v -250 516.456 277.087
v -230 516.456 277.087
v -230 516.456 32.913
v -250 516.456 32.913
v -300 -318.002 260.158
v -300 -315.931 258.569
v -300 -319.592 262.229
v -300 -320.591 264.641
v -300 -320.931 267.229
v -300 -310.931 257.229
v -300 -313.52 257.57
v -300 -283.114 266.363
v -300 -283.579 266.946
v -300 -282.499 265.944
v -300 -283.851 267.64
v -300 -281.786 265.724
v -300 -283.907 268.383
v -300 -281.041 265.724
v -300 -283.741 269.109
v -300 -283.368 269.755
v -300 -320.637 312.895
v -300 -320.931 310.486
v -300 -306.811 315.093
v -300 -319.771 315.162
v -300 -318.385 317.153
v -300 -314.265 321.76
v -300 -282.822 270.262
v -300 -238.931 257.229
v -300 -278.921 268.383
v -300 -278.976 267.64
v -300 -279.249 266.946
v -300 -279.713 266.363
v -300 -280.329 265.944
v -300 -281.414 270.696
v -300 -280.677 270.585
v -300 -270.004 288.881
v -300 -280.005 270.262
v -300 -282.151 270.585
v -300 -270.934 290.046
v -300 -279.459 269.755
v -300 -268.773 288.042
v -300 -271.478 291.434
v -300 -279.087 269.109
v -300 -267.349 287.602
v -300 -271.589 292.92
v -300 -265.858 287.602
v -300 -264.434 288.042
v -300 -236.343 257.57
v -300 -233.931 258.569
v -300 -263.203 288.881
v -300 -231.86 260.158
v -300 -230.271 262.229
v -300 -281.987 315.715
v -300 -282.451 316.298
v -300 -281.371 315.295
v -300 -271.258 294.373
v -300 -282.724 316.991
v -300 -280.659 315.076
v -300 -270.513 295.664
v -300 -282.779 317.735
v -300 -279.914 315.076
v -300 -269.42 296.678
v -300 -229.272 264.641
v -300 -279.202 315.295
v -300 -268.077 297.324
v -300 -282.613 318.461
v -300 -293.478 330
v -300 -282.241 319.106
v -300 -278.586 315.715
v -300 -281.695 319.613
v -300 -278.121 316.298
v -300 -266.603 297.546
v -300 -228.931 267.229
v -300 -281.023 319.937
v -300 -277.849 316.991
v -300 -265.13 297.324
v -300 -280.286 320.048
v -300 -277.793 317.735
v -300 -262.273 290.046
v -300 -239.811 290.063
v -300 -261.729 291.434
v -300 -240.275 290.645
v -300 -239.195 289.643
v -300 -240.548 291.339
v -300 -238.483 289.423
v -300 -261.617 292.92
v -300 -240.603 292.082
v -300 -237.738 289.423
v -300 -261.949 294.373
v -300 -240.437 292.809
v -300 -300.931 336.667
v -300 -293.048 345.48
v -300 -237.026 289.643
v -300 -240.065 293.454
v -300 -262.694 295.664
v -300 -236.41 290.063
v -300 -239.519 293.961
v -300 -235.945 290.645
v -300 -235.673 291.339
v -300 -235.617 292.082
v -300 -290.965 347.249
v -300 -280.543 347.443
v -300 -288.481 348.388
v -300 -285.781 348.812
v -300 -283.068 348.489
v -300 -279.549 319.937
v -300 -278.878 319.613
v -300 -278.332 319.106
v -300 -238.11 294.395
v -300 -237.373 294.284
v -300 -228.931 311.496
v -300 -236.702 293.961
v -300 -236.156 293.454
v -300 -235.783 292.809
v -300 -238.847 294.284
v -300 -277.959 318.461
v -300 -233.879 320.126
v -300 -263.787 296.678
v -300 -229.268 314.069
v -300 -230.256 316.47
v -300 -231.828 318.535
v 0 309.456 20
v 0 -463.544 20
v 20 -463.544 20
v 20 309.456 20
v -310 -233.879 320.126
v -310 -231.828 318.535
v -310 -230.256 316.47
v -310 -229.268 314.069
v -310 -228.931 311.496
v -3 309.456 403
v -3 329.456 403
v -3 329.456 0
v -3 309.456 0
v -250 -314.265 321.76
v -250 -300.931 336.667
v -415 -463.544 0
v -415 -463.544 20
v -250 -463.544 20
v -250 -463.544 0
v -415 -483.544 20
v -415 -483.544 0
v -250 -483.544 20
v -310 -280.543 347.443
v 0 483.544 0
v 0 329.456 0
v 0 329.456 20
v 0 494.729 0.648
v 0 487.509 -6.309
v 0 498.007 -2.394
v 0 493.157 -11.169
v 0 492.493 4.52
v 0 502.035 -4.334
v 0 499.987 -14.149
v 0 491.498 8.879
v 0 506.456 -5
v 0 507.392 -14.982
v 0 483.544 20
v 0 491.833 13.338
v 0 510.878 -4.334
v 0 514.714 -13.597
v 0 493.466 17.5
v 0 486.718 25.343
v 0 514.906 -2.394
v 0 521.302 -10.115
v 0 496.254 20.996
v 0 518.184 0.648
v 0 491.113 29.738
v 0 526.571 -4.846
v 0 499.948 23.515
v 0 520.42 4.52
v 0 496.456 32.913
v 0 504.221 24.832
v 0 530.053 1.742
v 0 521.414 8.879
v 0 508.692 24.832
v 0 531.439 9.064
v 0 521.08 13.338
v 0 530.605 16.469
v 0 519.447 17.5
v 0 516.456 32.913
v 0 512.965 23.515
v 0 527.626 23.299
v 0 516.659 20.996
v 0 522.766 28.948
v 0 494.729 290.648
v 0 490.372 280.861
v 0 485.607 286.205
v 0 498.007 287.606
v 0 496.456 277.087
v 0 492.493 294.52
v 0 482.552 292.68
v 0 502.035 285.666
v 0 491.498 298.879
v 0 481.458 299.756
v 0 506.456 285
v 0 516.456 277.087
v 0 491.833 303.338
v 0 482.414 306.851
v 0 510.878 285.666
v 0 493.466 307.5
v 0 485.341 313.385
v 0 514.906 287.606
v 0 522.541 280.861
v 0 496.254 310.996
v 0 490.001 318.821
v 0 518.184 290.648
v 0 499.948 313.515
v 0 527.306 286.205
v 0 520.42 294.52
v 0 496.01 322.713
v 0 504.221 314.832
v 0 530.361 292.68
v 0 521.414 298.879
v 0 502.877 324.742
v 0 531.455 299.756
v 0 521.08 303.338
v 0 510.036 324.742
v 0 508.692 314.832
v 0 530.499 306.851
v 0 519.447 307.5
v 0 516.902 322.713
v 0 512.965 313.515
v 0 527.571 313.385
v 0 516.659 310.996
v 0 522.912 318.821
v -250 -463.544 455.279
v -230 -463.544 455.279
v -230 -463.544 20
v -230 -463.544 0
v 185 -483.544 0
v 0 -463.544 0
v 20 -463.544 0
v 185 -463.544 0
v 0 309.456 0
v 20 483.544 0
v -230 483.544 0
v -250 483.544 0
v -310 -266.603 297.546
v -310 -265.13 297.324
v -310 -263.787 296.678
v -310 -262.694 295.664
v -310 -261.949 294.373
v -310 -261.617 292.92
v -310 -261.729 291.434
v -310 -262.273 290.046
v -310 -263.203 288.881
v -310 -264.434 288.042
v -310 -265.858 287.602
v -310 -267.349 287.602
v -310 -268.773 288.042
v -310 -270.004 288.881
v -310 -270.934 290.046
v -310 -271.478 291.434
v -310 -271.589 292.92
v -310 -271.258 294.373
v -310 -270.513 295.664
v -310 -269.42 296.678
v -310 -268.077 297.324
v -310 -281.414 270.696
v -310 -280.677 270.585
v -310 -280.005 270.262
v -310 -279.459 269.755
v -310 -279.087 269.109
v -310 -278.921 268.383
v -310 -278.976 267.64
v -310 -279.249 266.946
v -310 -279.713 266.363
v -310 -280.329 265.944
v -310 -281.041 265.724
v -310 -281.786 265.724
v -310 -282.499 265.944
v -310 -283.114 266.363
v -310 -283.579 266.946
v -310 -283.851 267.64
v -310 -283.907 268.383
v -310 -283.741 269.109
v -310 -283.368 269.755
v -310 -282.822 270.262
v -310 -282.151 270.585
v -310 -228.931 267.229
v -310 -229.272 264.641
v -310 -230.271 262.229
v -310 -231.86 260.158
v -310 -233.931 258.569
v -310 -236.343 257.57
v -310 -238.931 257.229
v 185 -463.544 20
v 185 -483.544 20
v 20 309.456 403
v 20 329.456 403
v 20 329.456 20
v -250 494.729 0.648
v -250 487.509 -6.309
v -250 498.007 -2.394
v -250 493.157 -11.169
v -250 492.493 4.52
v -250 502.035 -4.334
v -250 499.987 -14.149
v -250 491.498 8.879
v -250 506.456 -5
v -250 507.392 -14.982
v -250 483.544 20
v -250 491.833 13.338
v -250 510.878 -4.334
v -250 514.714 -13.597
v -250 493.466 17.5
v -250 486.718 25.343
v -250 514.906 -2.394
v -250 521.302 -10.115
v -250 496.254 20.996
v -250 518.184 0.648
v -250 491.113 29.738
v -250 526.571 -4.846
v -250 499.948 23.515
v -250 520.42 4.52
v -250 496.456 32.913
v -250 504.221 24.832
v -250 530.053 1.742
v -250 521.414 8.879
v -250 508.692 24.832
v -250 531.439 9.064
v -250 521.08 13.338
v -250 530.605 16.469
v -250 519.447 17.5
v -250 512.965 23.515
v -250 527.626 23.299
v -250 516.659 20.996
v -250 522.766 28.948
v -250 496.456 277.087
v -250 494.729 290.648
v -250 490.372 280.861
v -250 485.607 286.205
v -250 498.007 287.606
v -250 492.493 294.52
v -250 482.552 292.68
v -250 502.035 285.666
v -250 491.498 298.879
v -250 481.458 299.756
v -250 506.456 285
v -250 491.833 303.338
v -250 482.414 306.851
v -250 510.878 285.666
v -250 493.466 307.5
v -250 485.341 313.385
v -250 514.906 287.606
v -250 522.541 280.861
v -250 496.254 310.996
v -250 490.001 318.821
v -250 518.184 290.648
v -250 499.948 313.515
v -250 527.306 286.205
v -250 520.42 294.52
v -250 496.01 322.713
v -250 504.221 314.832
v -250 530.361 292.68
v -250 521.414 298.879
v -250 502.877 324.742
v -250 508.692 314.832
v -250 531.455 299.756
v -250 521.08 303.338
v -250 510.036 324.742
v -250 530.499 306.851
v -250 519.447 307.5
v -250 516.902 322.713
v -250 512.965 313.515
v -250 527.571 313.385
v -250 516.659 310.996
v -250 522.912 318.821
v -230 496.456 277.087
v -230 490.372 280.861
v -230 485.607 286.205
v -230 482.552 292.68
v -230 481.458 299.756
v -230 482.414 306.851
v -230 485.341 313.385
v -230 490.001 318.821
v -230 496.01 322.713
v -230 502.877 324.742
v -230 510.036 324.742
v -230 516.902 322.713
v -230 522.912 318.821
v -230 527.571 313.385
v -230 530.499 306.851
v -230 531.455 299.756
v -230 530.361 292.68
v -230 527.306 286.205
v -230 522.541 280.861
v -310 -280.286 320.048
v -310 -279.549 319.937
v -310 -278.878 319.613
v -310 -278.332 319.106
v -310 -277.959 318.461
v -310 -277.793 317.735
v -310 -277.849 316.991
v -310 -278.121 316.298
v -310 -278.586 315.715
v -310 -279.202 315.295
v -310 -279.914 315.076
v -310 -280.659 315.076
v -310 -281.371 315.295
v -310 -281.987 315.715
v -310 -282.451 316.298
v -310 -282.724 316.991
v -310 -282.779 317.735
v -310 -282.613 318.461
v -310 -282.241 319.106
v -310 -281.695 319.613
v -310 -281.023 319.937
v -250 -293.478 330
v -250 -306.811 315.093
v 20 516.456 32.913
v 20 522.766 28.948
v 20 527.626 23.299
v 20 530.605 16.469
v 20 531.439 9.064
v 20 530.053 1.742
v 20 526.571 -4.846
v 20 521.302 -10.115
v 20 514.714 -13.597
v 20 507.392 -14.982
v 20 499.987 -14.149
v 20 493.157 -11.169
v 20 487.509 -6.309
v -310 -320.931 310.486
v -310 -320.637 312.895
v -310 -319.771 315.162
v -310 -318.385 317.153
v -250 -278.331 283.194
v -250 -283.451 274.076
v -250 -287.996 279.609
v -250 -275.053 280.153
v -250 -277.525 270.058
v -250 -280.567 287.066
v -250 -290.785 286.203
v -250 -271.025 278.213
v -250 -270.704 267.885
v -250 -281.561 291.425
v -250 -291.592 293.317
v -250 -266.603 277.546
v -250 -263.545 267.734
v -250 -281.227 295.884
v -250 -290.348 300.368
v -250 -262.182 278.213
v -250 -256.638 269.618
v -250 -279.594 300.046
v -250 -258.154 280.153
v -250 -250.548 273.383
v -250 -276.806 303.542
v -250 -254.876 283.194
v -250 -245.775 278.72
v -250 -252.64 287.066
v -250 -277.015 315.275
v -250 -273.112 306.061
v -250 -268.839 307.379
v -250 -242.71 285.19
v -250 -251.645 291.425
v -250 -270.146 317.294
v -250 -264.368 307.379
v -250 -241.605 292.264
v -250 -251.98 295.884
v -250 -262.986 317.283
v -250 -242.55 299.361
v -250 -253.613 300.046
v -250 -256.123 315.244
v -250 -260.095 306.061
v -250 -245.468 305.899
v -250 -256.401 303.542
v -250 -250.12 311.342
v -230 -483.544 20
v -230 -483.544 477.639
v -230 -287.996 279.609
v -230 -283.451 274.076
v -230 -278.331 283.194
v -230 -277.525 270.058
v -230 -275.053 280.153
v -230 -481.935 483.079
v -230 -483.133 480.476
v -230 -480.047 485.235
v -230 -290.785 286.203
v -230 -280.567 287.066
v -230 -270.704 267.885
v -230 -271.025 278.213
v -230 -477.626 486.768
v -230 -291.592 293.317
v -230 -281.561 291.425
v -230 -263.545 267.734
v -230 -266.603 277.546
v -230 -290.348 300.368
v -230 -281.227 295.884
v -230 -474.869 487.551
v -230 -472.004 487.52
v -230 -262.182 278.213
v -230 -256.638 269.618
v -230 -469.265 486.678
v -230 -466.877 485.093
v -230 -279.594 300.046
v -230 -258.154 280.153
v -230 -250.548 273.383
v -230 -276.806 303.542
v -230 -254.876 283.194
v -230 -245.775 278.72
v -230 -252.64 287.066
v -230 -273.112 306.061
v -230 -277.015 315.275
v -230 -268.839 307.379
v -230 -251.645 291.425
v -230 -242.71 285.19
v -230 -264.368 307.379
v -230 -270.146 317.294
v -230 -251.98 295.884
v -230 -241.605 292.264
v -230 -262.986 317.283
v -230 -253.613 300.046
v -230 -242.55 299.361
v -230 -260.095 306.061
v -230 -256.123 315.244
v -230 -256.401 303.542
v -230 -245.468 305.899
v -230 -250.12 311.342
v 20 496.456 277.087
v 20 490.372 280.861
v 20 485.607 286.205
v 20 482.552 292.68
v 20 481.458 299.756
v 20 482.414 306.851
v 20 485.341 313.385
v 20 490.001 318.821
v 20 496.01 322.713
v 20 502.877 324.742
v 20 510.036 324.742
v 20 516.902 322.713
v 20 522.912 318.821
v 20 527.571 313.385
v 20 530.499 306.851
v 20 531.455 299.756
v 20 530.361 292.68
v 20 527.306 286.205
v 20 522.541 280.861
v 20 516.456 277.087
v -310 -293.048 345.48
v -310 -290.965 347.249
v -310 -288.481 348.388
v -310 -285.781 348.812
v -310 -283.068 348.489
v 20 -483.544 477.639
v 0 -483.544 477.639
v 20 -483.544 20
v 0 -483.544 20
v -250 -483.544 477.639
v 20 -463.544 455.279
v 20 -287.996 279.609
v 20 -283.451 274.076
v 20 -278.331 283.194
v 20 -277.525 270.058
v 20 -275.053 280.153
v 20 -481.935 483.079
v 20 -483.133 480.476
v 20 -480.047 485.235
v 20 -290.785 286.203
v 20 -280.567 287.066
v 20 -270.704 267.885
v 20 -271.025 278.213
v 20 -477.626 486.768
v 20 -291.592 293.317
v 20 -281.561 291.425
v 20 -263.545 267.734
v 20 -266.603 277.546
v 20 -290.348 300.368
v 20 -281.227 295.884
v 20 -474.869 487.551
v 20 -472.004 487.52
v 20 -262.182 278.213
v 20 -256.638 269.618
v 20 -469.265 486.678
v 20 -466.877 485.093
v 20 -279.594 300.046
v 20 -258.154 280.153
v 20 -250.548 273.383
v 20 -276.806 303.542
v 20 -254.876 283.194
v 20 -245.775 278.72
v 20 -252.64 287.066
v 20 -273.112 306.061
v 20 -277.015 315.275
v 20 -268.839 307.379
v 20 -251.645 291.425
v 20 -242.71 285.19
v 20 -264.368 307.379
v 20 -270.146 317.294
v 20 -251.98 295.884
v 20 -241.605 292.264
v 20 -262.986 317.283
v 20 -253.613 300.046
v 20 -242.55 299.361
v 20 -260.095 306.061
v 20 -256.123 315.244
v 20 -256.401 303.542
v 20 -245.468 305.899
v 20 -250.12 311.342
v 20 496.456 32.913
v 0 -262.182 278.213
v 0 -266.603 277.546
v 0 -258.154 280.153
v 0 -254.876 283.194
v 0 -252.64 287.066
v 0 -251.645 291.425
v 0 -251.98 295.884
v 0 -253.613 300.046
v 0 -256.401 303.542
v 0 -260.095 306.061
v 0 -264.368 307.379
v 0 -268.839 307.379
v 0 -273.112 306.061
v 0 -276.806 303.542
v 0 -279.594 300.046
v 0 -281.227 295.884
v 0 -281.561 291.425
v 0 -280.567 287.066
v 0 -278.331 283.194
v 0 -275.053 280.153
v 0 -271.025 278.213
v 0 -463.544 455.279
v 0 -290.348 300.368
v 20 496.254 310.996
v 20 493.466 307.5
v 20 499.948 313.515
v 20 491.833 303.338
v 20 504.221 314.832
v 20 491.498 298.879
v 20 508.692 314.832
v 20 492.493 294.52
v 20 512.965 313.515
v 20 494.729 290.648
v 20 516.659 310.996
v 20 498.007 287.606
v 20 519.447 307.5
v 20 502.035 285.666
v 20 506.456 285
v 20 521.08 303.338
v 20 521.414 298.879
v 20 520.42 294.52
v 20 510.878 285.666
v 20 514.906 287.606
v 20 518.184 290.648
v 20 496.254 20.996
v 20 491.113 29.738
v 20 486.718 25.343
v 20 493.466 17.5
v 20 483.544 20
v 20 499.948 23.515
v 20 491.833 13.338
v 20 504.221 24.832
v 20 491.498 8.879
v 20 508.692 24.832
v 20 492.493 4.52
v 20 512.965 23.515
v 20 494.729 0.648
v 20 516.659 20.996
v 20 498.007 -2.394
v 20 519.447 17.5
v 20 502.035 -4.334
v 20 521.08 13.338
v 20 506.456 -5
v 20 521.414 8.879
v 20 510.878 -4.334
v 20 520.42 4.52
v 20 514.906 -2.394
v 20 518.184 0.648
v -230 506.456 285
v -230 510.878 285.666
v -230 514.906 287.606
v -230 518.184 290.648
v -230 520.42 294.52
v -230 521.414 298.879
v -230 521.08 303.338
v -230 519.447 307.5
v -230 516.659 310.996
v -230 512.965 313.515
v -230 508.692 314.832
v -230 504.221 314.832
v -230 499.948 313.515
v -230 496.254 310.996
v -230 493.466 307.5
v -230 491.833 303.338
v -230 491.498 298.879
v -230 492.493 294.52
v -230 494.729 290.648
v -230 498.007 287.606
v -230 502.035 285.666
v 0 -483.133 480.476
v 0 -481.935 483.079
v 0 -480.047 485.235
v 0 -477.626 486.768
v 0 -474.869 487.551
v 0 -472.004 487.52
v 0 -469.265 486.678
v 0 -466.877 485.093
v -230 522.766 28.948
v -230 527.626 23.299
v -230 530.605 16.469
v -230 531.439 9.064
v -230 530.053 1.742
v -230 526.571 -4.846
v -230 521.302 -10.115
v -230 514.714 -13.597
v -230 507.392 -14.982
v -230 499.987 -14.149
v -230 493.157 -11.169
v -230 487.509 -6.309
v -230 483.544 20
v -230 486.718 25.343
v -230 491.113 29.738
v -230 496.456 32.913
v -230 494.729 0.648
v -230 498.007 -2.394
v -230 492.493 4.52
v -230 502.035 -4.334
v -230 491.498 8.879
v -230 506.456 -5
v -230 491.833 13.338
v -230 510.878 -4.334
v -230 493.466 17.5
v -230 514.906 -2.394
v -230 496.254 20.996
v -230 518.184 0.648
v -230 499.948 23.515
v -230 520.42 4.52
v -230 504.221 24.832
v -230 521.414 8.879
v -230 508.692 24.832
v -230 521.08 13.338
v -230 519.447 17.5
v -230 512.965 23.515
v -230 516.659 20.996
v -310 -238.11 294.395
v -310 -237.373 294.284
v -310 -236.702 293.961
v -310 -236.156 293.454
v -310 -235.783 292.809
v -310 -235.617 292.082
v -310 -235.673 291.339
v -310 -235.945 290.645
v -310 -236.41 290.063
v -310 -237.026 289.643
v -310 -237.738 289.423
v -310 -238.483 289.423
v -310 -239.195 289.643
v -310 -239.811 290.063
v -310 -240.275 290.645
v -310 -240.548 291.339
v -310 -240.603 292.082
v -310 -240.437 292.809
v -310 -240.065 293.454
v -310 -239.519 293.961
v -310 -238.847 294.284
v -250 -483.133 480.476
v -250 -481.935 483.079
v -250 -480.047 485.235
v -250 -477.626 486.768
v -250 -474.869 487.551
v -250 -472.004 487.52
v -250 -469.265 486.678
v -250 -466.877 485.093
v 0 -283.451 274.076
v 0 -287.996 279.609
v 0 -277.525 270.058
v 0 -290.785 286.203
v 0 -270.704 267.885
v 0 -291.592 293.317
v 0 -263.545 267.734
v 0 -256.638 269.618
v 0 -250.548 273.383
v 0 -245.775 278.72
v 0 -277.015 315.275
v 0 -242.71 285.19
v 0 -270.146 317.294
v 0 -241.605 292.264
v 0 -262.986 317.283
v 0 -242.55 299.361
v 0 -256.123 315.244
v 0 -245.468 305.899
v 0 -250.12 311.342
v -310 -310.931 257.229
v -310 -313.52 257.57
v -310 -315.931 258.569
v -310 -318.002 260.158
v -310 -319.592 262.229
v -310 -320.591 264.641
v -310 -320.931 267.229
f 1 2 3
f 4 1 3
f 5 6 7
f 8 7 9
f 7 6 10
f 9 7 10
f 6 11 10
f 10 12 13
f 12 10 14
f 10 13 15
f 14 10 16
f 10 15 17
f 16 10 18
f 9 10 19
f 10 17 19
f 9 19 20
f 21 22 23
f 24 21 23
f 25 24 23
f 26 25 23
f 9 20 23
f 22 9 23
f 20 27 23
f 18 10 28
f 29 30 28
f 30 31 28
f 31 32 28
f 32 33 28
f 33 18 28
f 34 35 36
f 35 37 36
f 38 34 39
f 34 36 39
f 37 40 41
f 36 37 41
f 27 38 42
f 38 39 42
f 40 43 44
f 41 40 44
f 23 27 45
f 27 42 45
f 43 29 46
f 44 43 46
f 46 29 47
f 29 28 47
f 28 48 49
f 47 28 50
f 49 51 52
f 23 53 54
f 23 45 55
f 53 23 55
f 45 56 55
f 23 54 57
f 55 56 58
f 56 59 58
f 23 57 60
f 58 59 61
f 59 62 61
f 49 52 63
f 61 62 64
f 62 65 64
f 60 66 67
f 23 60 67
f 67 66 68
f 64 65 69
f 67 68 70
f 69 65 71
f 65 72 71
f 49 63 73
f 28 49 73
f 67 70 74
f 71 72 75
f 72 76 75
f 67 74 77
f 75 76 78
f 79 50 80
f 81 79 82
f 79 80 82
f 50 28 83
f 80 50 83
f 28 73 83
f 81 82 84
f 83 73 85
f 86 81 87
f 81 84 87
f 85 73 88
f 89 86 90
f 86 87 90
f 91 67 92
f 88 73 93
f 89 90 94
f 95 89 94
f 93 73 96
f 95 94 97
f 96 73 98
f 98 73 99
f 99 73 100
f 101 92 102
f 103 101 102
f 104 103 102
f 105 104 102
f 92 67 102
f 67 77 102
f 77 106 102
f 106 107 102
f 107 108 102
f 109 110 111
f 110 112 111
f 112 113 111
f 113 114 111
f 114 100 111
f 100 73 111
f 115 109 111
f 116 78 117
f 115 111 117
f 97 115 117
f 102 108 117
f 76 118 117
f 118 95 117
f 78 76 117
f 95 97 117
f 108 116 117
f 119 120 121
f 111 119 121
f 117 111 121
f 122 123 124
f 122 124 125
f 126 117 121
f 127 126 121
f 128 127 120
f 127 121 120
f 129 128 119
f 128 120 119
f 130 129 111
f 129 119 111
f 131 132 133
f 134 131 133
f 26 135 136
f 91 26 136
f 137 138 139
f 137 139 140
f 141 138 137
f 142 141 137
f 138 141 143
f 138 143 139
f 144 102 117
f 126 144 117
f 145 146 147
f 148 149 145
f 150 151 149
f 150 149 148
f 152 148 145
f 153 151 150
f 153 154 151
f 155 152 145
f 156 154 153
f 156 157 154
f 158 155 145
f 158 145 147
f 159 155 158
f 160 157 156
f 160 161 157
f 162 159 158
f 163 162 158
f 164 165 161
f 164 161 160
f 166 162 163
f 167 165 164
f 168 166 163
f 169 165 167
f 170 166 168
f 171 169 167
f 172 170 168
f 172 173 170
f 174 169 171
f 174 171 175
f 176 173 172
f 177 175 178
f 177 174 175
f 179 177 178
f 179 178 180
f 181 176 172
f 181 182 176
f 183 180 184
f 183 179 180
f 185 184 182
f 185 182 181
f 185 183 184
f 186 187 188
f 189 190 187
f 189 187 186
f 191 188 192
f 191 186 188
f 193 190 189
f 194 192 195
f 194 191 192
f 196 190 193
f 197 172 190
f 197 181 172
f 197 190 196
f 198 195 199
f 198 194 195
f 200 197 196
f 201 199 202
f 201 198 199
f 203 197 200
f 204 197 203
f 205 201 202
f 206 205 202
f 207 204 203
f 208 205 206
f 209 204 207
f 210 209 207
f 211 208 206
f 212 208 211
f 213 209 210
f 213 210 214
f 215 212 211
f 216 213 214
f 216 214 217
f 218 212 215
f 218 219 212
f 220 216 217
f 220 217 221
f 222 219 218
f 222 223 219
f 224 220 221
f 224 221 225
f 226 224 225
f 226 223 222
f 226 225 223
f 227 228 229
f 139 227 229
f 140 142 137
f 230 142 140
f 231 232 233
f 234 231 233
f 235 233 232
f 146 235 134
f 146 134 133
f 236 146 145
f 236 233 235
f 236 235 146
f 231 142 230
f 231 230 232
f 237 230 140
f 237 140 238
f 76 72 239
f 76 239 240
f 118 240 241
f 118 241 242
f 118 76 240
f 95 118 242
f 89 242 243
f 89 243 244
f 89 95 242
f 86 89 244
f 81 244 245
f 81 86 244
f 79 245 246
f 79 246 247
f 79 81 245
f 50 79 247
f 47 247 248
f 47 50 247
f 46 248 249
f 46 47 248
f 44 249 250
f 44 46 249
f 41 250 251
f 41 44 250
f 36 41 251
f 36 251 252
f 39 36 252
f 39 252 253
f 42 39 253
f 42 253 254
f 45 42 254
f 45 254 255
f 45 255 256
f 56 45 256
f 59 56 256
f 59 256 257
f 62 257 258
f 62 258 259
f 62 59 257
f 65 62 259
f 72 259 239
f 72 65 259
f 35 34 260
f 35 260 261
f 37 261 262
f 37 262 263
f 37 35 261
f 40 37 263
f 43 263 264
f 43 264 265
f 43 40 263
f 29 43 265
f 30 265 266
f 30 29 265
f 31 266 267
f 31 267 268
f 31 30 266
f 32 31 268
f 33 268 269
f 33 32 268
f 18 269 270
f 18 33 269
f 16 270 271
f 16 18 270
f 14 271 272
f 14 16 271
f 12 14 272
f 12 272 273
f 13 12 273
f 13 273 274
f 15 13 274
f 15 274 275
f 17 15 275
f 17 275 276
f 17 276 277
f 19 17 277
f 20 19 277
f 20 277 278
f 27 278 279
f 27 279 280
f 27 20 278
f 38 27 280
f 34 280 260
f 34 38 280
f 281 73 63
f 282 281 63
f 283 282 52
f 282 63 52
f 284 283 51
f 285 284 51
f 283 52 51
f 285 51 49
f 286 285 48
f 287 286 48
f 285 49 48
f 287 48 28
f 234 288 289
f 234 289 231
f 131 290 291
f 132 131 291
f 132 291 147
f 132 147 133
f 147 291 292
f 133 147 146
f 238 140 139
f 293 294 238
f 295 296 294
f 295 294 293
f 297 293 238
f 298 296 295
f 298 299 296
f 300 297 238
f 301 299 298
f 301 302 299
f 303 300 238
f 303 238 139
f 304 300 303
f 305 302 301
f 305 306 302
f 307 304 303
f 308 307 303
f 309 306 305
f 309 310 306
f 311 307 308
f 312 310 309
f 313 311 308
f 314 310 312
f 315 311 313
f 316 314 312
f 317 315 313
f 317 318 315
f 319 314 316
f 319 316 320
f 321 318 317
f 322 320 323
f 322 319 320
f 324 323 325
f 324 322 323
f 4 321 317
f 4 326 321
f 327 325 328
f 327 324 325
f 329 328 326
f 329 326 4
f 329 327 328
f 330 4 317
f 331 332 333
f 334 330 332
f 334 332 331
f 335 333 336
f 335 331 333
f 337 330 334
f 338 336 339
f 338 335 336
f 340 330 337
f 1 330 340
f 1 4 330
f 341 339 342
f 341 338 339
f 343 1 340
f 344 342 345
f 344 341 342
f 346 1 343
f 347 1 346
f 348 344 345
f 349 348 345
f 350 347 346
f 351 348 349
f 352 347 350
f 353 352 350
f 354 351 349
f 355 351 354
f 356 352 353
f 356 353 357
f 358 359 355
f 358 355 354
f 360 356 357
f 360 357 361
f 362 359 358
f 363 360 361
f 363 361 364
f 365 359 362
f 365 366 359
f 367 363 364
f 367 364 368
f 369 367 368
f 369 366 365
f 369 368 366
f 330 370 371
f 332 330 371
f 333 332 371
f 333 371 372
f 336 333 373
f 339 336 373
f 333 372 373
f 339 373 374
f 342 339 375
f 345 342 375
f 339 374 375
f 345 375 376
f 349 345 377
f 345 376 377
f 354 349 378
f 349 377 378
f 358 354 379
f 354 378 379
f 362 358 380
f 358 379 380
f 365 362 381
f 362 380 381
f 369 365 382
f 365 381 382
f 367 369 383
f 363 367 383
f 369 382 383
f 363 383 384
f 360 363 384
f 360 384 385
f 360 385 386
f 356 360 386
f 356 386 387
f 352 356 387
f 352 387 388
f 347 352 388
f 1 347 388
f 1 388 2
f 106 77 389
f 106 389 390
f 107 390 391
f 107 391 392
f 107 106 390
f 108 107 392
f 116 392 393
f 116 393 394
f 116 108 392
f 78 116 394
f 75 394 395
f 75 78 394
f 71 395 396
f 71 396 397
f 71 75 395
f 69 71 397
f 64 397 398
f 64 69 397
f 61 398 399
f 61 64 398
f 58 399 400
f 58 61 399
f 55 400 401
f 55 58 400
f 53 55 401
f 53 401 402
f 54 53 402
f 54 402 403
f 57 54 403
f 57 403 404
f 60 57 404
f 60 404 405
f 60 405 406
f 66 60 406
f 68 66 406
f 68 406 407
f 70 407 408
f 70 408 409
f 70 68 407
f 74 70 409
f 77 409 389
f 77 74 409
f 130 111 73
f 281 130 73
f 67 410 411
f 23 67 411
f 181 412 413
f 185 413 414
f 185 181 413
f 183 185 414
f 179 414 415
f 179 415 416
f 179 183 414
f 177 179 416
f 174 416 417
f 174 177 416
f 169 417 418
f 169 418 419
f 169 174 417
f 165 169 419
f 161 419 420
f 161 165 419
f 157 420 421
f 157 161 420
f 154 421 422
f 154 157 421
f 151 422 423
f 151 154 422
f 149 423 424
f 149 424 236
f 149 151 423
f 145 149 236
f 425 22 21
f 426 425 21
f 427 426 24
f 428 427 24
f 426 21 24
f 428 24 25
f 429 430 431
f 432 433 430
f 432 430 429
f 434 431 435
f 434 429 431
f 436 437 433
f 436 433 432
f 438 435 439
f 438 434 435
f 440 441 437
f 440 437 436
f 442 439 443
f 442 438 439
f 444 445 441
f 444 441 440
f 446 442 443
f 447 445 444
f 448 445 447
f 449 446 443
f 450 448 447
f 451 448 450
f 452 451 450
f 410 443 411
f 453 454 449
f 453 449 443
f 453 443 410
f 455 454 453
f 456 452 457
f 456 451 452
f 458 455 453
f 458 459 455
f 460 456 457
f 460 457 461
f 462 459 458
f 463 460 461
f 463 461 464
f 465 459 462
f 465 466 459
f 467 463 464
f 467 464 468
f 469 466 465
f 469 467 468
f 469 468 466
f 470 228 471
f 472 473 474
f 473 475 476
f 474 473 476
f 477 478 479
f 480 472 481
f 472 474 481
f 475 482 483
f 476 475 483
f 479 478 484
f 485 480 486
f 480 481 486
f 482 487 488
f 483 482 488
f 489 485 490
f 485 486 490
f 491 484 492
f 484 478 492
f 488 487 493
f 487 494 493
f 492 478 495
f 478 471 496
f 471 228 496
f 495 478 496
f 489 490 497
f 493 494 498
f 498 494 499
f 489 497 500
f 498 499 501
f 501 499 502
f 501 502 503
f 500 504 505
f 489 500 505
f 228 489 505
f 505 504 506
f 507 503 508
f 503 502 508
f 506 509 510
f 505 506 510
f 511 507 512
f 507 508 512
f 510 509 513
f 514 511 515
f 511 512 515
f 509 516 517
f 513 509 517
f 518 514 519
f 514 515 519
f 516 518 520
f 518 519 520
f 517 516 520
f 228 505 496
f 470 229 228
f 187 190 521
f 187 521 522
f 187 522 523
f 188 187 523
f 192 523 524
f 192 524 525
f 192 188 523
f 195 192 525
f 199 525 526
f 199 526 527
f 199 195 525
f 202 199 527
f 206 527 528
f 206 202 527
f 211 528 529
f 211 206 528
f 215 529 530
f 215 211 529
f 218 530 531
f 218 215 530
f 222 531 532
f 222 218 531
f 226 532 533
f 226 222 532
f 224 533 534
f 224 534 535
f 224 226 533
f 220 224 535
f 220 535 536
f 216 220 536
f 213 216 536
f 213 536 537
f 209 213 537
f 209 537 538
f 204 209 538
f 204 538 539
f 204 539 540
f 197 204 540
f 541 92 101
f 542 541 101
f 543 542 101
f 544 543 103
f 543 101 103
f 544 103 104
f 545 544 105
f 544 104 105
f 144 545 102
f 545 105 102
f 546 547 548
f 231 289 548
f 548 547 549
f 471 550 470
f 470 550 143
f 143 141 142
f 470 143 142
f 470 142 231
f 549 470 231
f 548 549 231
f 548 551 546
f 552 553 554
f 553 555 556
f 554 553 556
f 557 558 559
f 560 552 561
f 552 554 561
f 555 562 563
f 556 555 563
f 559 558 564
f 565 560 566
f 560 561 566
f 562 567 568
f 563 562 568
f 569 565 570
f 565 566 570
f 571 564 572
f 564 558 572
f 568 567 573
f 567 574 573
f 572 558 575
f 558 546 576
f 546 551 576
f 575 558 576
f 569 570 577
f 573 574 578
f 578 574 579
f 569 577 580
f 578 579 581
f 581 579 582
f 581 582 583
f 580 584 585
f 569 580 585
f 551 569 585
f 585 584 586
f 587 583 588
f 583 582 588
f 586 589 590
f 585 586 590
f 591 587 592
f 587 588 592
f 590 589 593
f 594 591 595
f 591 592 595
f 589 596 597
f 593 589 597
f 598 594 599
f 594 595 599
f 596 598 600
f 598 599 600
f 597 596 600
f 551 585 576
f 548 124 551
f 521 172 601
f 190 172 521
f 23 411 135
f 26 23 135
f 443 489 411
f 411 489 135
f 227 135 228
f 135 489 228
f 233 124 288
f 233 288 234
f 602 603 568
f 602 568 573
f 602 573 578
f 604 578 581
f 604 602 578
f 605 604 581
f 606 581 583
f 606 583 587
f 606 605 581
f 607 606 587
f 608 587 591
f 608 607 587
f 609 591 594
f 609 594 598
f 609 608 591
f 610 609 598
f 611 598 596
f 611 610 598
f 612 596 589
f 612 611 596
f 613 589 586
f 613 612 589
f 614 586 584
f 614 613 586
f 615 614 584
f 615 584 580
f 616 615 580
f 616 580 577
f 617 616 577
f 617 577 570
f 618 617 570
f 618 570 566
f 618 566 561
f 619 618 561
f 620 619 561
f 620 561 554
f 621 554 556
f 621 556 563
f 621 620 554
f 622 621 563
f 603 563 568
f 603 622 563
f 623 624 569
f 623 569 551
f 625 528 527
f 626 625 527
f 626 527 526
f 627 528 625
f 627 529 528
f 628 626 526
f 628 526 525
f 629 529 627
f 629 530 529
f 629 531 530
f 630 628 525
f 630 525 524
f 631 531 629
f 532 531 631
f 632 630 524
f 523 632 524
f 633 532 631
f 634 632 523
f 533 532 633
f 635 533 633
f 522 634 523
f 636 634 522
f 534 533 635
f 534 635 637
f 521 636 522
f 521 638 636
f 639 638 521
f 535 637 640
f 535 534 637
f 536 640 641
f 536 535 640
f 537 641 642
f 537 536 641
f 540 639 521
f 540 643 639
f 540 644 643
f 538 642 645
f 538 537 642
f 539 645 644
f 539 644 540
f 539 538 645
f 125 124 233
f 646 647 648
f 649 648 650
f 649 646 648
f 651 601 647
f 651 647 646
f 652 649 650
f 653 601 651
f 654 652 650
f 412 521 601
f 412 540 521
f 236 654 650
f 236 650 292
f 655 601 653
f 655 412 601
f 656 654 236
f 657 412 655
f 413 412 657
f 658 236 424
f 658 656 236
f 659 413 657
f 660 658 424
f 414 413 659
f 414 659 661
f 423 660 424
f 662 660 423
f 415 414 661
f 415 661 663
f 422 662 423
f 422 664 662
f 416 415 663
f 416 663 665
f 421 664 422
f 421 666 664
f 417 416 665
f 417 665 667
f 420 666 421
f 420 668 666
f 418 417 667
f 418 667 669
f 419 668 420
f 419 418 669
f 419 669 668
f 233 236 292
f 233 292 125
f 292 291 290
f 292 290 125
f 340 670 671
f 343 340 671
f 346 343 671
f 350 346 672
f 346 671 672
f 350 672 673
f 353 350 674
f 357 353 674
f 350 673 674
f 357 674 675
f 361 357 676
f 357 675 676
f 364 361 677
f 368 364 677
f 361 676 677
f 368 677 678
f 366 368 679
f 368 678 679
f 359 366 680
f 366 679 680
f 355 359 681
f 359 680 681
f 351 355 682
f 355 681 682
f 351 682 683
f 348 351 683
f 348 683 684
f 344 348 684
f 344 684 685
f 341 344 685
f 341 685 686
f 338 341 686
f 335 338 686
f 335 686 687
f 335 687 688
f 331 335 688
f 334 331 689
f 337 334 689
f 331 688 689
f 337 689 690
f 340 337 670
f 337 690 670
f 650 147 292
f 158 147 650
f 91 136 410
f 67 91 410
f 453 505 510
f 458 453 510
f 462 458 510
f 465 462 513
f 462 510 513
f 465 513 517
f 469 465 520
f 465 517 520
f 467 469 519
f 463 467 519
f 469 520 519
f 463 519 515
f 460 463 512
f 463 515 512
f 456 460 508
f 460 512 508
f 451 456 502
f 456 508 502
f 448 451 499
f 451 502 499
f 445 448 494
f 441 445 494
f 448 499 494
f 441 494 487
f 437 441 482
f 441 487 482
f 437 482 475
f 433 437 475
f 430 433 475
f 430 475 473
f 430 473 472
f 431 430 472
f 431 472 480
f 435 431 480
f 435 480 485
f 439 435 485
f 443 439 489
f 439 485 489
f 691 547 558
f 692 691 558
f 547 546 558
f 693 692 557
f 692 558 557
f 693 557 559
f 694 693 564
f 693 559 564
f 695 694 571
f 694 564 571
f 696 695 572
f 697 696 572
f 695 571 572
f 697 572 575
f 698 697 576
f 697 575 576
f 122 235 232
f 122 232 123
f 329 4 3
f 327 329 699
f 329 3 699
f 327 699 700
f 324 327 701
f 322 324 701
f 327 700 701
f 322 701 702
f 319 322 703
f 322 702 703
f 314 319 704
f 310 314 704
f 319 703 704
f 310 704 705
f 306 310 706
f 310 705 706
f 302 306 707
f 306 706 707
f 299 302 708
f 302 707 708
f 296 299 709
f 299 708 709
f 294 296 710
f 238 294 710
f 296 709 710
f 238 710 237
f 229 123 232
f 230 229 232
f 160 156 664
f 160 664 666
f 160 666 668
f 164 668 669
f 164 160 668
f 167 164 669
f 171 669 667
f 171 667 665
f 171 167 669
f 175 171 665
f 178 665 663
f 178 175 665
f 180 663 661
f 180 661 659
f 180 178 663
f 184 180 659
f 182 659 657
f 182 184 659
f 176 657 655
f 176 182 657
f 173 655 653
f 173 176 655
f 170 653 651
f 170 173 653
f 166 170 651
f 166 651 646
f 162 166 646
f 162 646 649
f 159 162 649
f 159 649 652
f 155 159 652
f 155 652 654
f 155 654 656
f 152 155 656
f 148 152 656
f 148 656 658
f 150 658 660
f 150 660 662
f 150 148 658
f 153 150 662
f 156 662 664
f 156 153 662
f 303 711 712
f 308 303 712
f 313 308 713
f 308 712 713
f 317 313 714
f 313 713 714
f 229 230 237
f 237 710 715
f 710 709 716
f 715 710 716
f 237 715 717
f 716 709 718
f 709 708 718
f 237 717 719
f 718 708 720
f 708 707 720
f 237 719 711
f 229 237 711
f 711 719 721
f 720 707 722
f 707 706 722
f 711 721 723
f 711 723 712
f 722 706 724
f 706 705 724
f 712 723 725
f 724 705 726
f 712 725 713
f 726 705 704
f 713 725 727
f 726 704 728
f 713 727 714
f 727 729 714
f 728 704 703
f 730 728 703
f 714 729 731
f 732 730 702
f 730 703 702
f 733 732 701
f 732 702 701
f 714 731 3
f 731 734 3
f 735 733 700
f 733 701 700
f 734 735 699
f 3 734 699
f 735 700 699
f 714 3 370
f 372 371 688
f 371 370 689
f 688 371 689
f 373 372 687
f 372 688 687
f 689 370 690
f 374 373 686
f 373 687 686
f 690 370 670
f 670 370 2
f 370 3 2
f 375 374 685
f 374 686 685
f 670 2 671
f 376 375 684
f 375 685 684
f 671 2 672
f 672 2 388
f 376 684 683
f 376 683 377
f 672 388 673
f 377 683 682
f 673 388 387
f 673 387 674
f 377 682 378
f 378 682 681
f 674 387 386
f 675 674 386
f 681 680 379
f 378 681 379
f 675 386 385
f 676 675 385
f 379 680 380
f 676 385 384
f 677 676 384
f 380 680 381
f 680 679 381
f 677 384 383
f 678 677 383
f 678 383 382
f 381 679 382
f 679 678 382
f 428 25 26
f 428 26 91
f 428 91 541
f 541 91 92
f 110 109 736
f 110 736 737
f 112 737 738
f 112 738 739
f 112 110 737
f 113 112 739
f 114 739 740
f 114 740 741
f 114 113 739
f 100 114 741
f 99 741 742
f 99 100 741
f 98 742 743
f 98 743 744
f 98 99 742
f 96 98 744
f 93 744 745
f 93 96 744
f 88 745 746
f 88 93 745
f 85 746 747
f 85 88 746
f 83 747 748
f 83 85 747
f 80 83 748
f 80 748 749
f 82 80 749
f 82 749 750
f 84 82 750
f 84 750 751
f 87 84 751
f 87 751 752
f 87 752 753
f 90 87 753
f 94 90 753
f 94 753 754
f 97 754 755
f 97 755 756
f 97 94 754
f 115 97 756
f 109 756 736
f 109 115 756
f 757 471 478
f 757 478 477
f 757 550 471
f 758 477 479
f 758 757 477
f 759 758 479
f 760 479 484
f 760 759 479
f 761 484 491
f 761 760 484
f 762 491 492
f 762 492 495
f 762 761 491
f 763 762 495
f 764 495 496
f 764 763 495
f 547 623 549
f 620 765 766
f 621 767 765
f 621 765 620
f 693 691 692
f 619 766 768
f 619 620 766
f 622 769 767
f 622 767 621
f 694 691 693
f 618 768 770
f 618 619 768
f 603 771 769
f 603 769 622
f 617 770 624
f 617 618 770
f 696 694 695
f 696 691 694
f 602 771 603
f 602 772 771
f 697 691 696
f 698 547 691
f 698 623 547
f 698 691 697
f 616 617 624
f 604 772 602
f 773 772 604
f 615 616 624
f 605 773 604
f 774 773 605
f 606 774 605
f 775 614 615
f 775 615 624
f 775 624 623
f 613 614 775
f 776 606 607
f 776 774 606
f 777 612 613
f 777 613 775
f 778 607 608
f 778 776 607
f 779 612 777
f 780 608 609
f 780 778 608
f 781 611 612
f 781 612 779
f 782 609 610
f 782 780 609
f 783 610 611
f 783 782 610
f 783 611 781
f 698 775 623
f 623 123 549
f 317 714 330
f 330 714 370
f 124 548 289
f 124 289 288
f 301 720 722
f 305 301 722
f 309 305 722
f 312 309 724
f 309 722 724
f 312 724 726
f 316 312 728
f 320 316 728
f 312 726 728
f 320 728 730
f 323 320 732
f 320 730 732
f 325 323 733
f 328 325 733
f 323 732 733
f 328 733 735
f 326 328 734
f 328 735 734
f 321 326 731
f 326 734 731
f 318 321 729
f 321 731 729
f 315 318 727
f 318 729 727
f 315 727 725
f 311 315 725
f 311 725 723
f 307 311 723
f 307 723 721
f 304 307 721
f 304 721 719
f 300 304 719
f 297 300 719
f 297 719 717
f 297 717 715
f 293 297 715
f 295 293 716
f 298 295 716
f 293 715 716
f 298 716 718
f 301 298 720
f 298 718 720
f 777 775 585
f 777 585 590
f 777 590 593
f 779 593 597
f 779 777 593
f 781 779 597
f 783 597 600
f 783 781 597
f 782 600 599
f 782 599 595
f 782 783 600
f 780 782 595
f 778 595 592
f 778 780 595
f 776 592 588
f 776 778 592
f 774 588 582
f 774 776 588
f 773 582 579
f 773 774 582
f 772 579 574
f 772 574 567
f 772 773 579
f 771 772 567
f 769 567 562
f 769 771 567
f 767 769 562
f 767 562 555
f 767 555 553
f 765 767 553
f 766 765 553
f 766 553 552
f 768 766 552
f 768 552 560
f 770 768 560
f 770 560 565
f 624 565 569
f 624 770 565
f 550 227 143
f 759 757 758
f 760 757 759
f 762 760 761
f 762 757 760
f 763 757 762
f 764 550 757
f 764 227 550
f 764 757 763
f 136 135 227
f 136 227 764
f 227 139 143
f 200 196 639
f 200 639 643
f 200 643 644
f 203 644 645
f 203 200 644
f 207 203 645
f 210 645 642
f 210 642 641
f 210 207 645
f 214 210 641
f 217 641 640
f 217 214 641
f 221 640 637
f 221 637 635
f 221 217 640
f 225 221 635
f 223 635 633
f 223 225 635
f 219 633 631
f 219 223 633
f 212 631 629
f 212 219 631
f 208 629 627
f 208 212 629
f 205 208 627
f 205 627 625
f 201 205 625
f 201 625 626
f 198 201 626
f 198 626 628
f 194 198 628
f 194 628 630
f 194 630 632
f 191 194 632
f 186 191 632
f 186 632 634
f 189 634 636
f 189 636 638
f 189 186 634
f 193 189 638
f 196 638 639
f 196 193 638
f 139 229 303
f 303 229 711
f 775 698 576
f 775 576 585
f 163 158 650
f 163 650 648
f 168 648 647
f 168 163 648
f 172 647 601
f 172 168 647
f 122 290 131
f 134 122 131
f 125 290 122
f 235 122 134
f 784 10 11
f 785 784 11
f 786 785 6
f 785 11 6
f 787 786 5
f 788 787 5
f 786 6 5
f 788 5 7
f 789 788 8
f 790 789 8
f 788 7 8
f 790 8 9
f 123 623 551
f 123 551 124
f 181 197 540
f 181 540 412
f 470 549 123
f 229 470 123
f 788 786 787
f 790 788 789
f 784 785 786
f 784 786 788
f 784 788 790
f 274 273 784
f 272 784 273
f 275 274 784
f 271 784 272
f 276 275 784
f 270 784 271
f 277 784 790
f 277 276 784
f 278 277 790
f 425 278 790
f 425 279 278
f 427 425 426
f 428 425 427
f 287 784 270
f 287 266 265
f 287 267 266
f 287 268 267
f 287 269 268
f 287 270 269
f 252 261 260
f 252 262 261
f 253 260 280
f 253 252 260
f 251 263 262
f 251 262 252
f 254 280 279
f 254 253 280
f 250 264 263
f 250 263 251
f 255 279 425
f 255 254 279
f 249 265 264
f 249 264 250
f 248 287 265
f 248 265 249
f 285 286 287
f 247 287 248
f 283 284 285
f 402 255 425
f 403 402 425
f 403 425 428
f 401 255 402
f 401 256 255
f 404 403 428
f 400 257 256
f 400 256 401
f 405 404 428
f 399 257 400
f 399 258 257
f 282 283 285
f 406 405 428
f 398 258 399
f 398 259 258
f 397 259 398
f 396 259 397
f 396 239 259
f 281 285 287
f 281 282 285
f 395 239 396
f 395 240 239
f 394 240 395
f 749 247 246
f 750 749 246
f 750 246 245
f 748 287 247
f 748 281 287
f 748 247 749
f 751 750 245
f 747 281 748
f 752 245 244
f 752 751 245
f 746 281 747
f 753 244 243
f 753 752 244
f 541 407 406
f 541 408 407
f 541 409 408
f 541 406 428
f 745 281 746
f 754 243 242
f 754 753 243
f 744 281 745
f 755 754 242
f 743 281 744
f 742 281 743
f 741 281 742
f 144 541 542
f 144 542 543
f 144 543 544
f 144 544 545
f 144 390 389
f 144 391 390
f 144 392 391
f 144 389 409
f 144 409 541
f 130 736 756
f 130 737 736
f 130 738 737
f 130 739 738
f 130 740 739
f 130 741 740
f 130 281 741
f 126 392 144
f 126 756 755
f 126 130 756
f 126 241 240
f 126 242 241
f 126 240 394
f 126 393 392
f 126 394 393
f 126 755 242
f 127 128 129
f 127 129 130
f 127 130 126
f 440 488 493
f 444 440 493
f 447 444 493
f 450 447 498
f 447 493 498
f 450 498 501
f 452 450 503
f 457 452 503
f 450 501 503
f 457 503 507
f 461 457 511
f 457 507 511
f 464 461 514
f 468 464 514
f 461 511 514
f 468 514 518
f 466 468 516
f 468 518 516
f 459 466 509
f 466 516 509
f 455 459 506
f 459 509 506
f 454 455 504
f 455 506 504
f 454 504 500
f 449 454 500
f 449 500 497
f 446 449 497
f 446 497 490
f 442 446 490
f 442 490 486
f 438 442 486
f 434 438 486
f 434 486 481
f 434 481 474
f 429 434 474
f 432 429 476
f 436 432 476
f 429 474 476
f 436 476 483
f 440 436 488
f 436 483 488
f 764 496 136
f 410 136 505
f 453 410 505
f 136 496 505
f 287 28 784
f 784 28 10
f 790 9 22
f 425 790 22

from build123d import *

# Parameters (mm, degrees)
SKETCH1_R                = 15
BOSS_EXTRUDE1_DEPTH      = 20
FILLET1_R                = 10
BOSS_EXTRUDE2_DEPTH      = 300
BOSS_EXTRUDE2_DEPTH_BACK = 300
SKETCH2_W                = 20
SKETCH2_H                = 20
SKETCH3_W                = 403
SKETCH3_H                = 20
BOSS_EXTRUDE3_DEPTH      = 23
BOSS_EXTRUDE4_DEPTH      = 50
SKETCH5_R                = 2.5
SKETCH5_R_2              = 5
BOSS_EXTRUDE5_DEPTH      = 10


with BuildPart() as part:
    # Sketch1 → Boss-Extrude1 (new body)
    with BuildSketch(Plane(origin=(0, 0, 0), x_dir=(0, 0, -1), z_dir=(1, 0, 0))):
        with BuildLine():
            Line((-277.087121525, 516.456439237), (-32.912878475, 516.456439237))
            ThreePointArc((-32.912878475, 516.456439237), (7.67766953, 524.134108767), (0, 483.543560763))
            Line((0, 483.543560763), (0, -483.543560763))
            Line((0, -483.543560763), (-500, -483.543560763))
            Line((-500, -483.543560763), (-315.275252317, -277.015014289))
            ThreePointArc((-315.275252317, -277.015014289), (-275.879773408, -247.969529867), (-300.368132467, -290.348347623))
            Line((-300.368132467, -290.348347623), (-455.27864045, -463.543560763))
            Line((-455.27864045, -463.543560763), (-20, -463.543560763))
            Line((-20, -463.543560763), (-20, 483.543560763))
            ThreePointArc((-20, 483.543560763), (-27.67766953, 488.778769708), (-32.912878475, 496.456439237))
            Line((-32.912878475, 496.456439237), (-277.087121525, 496.456439237))
            ThreePointArc((-277.087121525, 496.456439237), (-325, 506.456439237), (-277.087121525, 516.456439237))
        make_face()
        with Locations((-292.546440075, -266.603429679)):
            Circle(SKETCH1_R, mode=Mode.SUBTRACT)
        with Locations((-300, 506.456439237)):
            Circle(SKETCH1_R, mode=Mode.SUBTRACT)
        with Locations((-10, 506.456439237)):
            Circle(SKETCH1_R, mode=Mode.SUBTRACT)
    extrude(amount=BOSS_EXTRUDE1_DEPTH)

    # Fillet1
    fillet1_edges = [part.edges().sort_by_distance(p)[0] for p in [
        (10, -483.543560763, 500),
    ]]
    fillet(fillet1_edges, radius=FILLET1_R)


with BuildPart() as body_2:
    # Mirror2: mirrored copy
    add(part.part.mirror(Plane(origin=(-115, 0, 0), x_dir=(0, 0, 1), z_dir=(1, 0, 0))))


with BuildPart() as part_1:
    add(part.part)

    add(body_2.part)  # Boss-Extrude2 merges body 2
    # Sketch2 → Boss-Extrude2 (add, two sides: drawn at the far end of the back side and taken through both)
    with BuildSketch(Plane(origin=(-115, 0, 0), x_dir=(0, 0, -1), z_dir=(1, 0, 0)).offset(-BOSS_EXTRUDE2_DEPTH_BACK)):
        with Locations((-10, -473.543560763)):
            Rectangle(SKETCH2_W, SKETCH2_H)
    extrude(amount=BOSS_EXTRUDE2_DEPTH + BOSS_EXTRUDE2_DEPTH_BACK)

    # Sketch3 → Boss-Extrude3 (add)
    with BuildSketch(Plane(origin=(20, 0, 0), x_dir=(0, 0, -1), z_dir=(1, 0, 0))):
        with Locations((-201.5, 319.456439237)):
            Rectangle(SKETCH3_W, SKETCH3_H)
    extrude(amount=-BOSS_EXTRUDE3_DEPTH)

    # Sketch4 → Boss-Extrude4 (add)
    with BuildSketch(Plane.ZY.offset(250)):
        Polygon((330, -293.477782675), (315.09288015, -306.811116008), (321.759546817, -314.264675933), (336.666666667, -300.9313426), align=None)
    extrude(amount=BOSS_EXTRUDE4_DEPTH)

    # Sketch5 → Boss-Extrude5 (add)
    with BuildSketch(Plane.ZY.offset(300)):
        with BuildLine():
            Line((317.152993446, -318.384902525), (345.480143996, -293.048328829))
            ThreePointArc((345.480143996, -293.048328829), (348.692480121, -287.145673106), (347.443414331, -280.542622098))
            Line((347.443414331, -280.542622098), (320.125662167, -233.879195794))
            ThreePointArc((320.125662167, -233.879195794), (316.469583424, -230.256048136), (311.495725166, -228.9313426))
            Line((311.495725166, -228.9313426), (267.229084741, -228.9313426))
            ThreePointArc((267.229084741, -228.9313426), (260.158016929, -231.860274788), (257.229084741, -238.9313426))
            Line((257.229084741, -238.9313426), (257.229084741, -310.9313426))
            ThreePointArc((257.229084741, -310.9313426), (260.158016929, -318.002410412), (267.229084741, -320.9313426))
            Line((267.229084741, -320.9313426), (310.486326779, -320.9313426))
            ThreePointArc((310.486326779, -320.9313426), (314.054547677, -320.27306619), (317.152993446, -318.384902525))
        make_face()
        with Locations((317.547753068, -280.286250567)):
            Circle(SKETCH5_R, mode=Mode.SUBTRACT)
        with Locations((268.196113094, -281.413791415)):
            Circle(SKETCH5_R, mode=Mode.SUBTRACT)
        with Locations((291.895454063, -238.110247055)):
            Circle(SKETCH5_R, mode=Mode.SUBTRACT)
        with Locations((292.546440075, -266.603429679)):
            Circle(SKETCH5_R_2, mode=Mode.SUBTRACT)
    extrude(amount=BOSS_EXTRUDE5_DEPTH)


solid = part_1.part
